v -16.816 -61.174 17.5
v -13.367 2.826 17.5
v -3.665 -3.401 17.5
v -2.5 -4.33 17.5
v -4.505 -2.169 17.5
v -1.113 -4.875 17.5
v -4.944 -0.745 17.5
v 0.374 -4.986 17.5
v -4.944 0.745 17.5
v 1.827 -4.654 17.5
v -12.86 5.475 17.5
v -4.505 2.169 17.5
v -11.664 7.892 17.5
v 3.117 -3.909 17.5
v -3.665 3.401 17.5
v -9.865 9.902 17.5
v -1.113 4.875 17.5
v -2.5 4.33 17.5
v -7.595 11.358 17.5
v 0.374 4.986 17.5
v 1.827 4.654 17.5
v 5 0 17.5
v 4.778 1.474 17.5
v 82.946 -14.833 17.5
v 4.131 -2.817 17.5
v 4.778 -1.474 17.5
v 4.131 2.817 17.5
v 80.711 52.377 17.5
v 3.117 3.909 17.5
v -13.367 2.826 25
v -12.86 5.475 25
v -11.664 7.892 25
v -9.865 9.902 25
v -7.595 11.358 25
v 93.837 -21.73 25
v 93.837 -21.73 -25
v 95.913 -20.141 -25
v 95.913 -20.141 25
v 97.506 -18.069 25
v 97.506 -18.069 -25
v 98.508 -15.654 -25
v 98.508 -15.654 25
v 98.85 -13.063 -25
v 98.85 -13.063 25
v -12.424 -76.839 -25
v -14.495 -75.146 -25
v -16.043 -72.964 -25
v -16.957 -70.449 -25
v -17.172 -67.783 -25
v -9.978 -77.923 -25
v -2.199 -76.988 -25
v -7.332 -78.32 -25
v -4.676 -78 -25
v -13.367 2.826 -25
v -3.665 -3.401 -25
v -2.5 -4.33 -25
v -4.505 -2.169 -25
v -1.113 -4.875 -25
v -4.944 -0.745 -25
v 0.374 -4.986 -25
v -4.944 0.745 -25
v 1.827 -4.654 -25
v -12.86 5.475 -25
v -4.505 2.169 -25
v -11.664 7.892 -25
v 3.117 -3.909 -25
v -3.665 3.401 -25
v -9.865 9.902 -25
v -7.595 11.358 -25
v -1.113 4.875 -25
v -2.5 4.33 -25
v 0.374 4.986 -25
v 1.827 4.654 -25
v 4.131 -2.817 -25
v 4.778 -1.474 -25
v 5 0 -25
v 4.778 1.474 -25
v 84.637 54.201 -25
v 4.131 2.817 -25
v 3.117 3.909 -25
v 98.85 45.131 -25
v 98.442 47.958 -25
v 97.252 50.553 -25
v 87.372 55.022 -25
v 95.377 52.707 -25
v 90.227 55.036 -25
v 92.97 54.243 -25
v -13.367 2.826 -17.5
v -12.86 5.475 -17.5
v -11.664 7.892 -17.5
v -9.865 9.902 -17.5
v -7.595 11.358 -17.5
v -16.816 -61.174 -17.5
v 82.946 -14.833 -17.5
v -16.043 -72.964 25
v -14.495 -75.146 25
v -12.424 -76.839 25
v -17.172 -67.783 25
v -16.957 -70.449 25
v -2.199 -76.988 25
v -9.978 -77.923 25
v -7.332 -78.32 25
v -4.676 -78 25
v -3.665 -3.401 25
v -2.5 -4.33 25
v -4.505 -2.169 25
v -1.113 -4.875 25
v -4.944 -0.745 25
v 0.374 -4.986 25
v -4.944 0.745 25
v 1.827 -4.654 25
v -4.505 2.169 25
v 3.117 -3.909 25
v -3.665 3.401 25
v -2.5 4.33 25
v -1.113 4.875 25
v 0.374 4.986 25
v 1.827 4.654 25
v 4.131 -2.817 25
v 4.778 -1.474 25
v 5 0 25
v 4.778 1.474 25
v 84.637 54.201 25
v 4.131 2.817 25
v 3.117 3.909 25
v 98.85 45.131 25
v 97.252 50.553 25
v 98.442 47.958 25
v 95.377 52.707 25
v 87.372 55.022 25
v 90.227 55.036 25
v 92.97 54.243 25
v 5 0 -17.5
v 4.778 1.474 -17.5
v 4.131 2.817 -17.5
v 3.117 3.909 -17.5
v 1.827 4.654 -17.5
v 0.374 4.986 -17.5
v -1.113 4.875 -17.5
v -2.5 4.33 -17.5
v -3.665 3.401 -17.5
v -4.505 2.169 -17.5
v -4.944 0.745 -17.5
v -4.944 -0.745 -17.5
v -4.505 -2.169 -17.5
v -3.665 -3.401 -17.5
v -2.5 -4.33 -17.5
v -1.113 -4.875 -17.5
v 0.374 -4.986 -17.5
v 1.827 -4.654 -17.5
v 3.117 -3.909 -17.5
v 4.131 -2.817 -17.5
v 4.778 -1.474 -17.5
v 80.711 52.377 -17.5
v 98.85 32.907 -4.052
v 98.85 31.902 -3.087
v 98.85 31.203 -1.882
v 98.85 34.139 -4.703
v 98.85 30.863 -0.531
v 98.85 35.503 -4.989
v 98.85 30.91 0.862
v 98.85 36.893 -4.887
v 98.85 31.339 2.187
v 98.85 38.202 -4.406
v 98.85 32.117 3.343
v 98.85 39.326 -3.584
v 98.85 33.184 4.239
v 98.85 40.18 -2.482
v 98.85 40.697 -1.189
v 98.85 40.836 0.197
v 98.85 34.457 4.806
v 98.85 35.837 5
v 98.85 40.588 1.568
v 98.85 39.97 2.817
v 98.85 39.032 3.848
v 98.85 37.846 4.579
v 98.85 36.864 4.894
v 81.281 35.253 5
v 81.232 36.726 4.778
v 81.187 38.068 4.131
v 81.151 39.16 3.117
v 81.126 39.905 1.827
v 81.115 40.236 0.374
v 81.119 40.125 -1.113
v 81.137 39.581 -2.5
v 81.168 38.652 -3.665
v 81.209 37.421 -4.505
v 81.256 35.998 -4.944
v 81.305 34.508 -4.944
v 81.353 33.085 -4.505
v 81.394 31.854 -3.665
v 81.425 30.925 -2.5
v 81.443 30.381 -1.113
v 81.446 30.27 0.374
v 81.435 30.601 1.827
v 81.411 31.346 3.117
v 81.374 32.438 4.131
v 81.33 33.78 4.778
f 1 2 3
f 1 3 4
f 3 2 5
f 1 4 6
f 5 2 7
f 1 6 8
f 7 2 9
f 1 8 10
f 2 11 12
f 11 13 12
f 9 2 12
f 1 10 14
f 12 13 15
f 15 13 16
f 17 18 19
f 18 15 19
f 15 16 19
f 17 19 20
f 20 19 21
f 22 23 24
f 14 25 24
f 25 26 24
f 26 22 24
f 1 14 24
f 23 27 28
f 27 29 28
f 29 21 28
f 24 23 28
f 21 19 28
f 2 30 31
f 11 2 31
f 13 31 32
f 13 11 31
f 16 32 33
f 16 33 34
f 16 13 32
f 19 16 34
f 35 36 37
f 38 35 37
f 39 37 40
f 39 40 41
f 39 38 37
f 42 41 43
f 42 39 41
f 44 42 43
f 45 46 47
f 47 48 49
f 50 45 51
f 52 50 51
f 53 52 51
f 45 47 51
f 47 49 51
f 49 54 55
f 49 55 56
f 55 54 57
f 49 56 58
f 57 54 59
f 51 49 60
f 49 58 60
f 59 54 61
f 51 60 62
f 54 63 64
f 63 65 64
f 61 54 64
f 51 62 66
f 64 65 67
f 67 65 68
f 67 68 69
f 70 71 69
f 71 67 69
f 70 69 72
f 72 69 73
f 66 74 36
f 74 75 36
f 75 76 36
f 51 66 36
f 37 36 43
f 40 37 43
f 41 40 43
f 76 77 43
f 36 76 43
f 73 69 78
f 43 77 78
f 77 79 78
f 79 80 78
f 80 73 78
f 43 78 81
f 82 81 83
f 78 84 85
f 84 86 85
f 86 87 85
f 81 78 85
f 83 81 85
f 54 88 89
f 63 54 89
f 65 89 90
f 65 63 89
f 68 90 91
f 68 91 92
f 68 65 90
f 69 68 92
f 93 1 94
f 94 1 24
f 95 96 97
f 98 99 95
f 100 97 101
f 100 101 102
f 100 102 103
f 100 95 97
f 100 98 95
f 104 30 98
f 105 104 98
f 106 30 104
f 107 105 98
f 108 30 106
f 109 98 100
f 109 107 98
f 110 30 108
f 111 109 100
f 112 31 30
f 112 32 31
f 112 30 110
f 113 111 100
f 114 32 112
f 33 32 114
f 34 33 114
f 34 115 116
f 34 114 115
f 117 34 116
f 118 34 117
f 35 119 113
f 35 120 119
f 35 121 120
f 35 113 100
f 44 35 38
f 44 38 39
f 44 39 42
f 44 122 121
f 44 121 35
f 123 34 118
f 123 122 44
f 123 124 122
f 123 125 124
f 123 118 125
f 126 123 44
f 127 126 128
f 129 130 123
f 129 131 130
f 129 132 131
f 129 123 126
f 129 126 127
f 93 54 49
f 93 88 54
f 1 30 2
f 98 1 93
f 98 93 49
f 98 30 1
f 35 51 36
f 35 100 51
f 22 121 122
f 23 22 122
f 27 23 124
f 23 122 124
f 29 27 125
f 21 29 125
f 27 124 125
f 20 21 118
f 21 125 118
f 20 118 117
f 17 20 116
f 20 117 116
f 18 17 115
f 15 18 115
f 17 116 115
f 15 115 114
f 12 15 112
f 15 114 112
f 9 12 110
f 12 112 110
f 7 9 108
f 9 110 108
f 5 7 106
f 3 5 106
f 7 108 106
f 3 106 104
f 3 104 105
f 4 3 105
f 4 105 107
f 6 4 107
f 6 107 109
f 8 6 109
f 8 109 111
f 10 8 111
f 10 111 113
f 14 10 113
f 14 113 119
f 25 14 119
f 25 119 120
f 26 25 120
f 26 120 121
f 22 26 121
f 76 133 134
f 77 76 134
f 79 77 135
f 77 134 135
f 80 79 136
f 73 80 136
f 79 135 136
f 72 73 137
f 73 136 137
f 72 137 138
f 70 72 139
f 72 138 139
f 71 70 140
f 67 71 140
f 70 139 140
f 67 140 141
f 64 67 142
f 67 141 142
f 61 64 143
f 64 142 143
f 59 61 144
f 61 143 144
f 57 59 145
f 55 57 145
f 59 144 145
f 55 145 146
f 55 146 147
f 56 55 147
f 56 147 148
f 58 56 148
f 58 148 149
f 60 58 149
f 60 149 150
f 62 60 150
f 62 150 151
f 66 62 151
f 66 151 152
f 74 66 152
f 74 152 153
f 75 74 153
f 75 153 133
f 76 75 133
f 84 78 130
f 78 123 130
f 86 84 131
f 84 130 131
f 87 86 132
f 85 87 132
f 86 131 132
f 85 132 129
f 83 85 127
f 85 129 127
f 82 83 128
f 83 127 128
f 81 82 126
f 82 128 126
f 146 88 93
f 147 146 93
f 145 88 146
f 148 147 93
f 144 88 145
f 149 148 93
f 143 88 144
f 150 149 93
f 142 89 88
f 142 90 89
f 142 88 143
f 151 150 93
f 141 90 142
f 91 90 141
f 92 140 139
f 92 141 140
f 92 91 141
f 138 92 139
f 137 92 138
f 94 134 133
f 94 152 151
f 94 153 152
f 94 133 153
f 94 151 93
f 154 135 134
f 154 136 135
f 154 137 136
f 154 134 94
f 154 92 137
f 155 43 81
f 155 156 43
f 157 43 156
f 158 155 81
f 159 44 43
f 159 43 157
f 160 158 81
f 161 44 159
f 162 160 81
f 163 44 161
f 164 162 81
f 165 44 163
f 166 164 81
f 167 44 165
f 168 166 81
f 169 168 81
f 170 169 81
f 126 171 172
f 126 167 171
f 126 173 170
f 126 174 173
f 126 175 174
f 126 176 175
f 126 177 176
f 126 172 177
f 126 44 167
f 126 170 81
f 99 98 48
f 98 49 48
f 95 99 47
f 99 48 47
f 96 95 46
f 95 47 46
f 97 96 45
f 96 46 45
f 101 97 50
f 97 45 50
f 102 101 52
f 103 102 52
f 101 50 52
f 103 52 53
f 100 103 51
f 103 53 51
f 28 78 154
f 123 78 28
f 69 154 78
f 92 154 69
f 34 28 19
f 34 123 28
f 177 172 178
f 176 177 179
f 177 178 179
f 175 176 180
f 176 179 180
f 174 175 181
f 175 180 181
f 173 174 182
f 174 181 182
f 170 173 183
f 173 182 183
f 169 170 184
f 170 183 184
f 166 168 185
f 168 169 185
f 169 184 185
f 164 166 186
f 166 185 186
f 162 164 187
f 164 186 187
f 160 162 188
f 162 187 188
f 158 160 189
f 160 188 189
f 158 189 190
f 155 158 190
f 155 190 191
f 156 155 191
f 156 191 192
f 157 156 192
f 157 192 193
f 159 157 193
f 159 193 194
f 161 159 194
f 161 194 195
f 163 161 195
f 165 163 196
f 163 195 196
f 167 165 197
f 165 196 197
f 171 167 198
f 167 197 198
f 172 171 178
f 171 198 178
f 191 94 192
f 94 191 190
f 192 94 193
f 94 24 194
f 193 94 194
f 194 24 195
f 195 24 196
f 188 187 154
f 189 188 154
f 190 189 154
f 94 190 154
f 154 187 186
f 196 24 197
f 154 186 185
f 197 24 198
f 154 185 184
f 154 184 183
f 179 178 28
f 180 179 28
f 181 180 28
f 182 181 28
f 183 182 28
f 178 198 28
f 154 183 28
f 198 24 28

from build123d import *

# Parameters (mm, degrees)
BOSS_EXTRU_2_DEPTH      = 25
ENL_V_MAT_EXTRU_1_DEPTH = 17.5
ESQUISSE3_R             = 5
ENL_V_MAT_EXTRU_2_DEPTH = 141.346637083
CONG_1_R                = 10
CONG_2_R                = 10
CONG_3_R                = 10
ESQUISSE5_R             = 5
ENL_V_MAT_EXTRU_3_DEPTH = 131.788342052


with BuildPart() as part:
    # Esquisse1 → Boss.-Extru.2 (new, symmetric)
    with BuildSketch(Plane.XY):
        Polygon((98.849698137, 60.802751576), (-13.043991627, 8.826246926), (-18.162962303, -86.173753074), (98.849698137, -18.845918586), align=None)
    extrude(amount=BOSS_EXTRU_2_DEPTH, both=True)

    # Esquisse2 → Enlèv. mat.-Extru.1 (cut, symmetric)
    with BuildSketch(Plane.XY):
        Polygon((-16.815864757, -61.173753074), (82.946312501, -14.832540436), (80.711120454, 52.377076551), (-13.043991627, 8.826246926), align=None)
    extrude(amount=ENL_V_MAT_EXTRU_1_DEPTH, both=True, mode=Mode.SUBTRACT)

    # Esquisse3 → Enlèv. mat.-Extru.2 (cut, through all)
    with BuildSketch(Plane.XY.offset(25)):
        Circle(ESQUISSE3_R)
    extrude(amount=-ENL_V_MAT_EXTRU_2_DEPTH, mode=Mode.SUBTRACT)

    # Congé1
    cong_1_edges = [part.edges().sort_by_distance(p)[0] for p in [
        (-13.043991627, 8.826246926, -21.25),
        (-13.043991627, 8.826246926, 21.25),
    ]]
    fillet(cong_1_edges, radius=CONG_1_R)

    # Congé2
    cong_2_edges = [part.edges().sort_by_distance(p)[0] for p in [
        (-18.162962303, -86.173753074, 0),
    ]]
    fillet(cong_2_edges, radius=CONG_2_R)

    # Congé3
    cong_3_edges = [part.edges().sort_by_distance(p)[0] for p in [
        (98.849698137, 60.802751576, 0),
        (98.849698137, -18.845918586, 0),
    ]]
    fillet(cong_3_edges, radius=CONG_3_R)

    # Esquisse5 → Enlèv. mat.-Extru.3 (cut, through all)
    with BuildSketch(Plane(origin=(82.361931549, 2.739112982, 0), x_dir=(0, 0, 1), z_dir=(-0.9994474433929438, -0.03323865062406649, 0))):
        with Locations((0, 32.532014282)):
            Circle(ESQUISSE5_R)
    extrude(amount=-ENL_V_MAT_EXTRU_3_DEPTH, mode=Mode.SUBTRACT)


solid = part.part
